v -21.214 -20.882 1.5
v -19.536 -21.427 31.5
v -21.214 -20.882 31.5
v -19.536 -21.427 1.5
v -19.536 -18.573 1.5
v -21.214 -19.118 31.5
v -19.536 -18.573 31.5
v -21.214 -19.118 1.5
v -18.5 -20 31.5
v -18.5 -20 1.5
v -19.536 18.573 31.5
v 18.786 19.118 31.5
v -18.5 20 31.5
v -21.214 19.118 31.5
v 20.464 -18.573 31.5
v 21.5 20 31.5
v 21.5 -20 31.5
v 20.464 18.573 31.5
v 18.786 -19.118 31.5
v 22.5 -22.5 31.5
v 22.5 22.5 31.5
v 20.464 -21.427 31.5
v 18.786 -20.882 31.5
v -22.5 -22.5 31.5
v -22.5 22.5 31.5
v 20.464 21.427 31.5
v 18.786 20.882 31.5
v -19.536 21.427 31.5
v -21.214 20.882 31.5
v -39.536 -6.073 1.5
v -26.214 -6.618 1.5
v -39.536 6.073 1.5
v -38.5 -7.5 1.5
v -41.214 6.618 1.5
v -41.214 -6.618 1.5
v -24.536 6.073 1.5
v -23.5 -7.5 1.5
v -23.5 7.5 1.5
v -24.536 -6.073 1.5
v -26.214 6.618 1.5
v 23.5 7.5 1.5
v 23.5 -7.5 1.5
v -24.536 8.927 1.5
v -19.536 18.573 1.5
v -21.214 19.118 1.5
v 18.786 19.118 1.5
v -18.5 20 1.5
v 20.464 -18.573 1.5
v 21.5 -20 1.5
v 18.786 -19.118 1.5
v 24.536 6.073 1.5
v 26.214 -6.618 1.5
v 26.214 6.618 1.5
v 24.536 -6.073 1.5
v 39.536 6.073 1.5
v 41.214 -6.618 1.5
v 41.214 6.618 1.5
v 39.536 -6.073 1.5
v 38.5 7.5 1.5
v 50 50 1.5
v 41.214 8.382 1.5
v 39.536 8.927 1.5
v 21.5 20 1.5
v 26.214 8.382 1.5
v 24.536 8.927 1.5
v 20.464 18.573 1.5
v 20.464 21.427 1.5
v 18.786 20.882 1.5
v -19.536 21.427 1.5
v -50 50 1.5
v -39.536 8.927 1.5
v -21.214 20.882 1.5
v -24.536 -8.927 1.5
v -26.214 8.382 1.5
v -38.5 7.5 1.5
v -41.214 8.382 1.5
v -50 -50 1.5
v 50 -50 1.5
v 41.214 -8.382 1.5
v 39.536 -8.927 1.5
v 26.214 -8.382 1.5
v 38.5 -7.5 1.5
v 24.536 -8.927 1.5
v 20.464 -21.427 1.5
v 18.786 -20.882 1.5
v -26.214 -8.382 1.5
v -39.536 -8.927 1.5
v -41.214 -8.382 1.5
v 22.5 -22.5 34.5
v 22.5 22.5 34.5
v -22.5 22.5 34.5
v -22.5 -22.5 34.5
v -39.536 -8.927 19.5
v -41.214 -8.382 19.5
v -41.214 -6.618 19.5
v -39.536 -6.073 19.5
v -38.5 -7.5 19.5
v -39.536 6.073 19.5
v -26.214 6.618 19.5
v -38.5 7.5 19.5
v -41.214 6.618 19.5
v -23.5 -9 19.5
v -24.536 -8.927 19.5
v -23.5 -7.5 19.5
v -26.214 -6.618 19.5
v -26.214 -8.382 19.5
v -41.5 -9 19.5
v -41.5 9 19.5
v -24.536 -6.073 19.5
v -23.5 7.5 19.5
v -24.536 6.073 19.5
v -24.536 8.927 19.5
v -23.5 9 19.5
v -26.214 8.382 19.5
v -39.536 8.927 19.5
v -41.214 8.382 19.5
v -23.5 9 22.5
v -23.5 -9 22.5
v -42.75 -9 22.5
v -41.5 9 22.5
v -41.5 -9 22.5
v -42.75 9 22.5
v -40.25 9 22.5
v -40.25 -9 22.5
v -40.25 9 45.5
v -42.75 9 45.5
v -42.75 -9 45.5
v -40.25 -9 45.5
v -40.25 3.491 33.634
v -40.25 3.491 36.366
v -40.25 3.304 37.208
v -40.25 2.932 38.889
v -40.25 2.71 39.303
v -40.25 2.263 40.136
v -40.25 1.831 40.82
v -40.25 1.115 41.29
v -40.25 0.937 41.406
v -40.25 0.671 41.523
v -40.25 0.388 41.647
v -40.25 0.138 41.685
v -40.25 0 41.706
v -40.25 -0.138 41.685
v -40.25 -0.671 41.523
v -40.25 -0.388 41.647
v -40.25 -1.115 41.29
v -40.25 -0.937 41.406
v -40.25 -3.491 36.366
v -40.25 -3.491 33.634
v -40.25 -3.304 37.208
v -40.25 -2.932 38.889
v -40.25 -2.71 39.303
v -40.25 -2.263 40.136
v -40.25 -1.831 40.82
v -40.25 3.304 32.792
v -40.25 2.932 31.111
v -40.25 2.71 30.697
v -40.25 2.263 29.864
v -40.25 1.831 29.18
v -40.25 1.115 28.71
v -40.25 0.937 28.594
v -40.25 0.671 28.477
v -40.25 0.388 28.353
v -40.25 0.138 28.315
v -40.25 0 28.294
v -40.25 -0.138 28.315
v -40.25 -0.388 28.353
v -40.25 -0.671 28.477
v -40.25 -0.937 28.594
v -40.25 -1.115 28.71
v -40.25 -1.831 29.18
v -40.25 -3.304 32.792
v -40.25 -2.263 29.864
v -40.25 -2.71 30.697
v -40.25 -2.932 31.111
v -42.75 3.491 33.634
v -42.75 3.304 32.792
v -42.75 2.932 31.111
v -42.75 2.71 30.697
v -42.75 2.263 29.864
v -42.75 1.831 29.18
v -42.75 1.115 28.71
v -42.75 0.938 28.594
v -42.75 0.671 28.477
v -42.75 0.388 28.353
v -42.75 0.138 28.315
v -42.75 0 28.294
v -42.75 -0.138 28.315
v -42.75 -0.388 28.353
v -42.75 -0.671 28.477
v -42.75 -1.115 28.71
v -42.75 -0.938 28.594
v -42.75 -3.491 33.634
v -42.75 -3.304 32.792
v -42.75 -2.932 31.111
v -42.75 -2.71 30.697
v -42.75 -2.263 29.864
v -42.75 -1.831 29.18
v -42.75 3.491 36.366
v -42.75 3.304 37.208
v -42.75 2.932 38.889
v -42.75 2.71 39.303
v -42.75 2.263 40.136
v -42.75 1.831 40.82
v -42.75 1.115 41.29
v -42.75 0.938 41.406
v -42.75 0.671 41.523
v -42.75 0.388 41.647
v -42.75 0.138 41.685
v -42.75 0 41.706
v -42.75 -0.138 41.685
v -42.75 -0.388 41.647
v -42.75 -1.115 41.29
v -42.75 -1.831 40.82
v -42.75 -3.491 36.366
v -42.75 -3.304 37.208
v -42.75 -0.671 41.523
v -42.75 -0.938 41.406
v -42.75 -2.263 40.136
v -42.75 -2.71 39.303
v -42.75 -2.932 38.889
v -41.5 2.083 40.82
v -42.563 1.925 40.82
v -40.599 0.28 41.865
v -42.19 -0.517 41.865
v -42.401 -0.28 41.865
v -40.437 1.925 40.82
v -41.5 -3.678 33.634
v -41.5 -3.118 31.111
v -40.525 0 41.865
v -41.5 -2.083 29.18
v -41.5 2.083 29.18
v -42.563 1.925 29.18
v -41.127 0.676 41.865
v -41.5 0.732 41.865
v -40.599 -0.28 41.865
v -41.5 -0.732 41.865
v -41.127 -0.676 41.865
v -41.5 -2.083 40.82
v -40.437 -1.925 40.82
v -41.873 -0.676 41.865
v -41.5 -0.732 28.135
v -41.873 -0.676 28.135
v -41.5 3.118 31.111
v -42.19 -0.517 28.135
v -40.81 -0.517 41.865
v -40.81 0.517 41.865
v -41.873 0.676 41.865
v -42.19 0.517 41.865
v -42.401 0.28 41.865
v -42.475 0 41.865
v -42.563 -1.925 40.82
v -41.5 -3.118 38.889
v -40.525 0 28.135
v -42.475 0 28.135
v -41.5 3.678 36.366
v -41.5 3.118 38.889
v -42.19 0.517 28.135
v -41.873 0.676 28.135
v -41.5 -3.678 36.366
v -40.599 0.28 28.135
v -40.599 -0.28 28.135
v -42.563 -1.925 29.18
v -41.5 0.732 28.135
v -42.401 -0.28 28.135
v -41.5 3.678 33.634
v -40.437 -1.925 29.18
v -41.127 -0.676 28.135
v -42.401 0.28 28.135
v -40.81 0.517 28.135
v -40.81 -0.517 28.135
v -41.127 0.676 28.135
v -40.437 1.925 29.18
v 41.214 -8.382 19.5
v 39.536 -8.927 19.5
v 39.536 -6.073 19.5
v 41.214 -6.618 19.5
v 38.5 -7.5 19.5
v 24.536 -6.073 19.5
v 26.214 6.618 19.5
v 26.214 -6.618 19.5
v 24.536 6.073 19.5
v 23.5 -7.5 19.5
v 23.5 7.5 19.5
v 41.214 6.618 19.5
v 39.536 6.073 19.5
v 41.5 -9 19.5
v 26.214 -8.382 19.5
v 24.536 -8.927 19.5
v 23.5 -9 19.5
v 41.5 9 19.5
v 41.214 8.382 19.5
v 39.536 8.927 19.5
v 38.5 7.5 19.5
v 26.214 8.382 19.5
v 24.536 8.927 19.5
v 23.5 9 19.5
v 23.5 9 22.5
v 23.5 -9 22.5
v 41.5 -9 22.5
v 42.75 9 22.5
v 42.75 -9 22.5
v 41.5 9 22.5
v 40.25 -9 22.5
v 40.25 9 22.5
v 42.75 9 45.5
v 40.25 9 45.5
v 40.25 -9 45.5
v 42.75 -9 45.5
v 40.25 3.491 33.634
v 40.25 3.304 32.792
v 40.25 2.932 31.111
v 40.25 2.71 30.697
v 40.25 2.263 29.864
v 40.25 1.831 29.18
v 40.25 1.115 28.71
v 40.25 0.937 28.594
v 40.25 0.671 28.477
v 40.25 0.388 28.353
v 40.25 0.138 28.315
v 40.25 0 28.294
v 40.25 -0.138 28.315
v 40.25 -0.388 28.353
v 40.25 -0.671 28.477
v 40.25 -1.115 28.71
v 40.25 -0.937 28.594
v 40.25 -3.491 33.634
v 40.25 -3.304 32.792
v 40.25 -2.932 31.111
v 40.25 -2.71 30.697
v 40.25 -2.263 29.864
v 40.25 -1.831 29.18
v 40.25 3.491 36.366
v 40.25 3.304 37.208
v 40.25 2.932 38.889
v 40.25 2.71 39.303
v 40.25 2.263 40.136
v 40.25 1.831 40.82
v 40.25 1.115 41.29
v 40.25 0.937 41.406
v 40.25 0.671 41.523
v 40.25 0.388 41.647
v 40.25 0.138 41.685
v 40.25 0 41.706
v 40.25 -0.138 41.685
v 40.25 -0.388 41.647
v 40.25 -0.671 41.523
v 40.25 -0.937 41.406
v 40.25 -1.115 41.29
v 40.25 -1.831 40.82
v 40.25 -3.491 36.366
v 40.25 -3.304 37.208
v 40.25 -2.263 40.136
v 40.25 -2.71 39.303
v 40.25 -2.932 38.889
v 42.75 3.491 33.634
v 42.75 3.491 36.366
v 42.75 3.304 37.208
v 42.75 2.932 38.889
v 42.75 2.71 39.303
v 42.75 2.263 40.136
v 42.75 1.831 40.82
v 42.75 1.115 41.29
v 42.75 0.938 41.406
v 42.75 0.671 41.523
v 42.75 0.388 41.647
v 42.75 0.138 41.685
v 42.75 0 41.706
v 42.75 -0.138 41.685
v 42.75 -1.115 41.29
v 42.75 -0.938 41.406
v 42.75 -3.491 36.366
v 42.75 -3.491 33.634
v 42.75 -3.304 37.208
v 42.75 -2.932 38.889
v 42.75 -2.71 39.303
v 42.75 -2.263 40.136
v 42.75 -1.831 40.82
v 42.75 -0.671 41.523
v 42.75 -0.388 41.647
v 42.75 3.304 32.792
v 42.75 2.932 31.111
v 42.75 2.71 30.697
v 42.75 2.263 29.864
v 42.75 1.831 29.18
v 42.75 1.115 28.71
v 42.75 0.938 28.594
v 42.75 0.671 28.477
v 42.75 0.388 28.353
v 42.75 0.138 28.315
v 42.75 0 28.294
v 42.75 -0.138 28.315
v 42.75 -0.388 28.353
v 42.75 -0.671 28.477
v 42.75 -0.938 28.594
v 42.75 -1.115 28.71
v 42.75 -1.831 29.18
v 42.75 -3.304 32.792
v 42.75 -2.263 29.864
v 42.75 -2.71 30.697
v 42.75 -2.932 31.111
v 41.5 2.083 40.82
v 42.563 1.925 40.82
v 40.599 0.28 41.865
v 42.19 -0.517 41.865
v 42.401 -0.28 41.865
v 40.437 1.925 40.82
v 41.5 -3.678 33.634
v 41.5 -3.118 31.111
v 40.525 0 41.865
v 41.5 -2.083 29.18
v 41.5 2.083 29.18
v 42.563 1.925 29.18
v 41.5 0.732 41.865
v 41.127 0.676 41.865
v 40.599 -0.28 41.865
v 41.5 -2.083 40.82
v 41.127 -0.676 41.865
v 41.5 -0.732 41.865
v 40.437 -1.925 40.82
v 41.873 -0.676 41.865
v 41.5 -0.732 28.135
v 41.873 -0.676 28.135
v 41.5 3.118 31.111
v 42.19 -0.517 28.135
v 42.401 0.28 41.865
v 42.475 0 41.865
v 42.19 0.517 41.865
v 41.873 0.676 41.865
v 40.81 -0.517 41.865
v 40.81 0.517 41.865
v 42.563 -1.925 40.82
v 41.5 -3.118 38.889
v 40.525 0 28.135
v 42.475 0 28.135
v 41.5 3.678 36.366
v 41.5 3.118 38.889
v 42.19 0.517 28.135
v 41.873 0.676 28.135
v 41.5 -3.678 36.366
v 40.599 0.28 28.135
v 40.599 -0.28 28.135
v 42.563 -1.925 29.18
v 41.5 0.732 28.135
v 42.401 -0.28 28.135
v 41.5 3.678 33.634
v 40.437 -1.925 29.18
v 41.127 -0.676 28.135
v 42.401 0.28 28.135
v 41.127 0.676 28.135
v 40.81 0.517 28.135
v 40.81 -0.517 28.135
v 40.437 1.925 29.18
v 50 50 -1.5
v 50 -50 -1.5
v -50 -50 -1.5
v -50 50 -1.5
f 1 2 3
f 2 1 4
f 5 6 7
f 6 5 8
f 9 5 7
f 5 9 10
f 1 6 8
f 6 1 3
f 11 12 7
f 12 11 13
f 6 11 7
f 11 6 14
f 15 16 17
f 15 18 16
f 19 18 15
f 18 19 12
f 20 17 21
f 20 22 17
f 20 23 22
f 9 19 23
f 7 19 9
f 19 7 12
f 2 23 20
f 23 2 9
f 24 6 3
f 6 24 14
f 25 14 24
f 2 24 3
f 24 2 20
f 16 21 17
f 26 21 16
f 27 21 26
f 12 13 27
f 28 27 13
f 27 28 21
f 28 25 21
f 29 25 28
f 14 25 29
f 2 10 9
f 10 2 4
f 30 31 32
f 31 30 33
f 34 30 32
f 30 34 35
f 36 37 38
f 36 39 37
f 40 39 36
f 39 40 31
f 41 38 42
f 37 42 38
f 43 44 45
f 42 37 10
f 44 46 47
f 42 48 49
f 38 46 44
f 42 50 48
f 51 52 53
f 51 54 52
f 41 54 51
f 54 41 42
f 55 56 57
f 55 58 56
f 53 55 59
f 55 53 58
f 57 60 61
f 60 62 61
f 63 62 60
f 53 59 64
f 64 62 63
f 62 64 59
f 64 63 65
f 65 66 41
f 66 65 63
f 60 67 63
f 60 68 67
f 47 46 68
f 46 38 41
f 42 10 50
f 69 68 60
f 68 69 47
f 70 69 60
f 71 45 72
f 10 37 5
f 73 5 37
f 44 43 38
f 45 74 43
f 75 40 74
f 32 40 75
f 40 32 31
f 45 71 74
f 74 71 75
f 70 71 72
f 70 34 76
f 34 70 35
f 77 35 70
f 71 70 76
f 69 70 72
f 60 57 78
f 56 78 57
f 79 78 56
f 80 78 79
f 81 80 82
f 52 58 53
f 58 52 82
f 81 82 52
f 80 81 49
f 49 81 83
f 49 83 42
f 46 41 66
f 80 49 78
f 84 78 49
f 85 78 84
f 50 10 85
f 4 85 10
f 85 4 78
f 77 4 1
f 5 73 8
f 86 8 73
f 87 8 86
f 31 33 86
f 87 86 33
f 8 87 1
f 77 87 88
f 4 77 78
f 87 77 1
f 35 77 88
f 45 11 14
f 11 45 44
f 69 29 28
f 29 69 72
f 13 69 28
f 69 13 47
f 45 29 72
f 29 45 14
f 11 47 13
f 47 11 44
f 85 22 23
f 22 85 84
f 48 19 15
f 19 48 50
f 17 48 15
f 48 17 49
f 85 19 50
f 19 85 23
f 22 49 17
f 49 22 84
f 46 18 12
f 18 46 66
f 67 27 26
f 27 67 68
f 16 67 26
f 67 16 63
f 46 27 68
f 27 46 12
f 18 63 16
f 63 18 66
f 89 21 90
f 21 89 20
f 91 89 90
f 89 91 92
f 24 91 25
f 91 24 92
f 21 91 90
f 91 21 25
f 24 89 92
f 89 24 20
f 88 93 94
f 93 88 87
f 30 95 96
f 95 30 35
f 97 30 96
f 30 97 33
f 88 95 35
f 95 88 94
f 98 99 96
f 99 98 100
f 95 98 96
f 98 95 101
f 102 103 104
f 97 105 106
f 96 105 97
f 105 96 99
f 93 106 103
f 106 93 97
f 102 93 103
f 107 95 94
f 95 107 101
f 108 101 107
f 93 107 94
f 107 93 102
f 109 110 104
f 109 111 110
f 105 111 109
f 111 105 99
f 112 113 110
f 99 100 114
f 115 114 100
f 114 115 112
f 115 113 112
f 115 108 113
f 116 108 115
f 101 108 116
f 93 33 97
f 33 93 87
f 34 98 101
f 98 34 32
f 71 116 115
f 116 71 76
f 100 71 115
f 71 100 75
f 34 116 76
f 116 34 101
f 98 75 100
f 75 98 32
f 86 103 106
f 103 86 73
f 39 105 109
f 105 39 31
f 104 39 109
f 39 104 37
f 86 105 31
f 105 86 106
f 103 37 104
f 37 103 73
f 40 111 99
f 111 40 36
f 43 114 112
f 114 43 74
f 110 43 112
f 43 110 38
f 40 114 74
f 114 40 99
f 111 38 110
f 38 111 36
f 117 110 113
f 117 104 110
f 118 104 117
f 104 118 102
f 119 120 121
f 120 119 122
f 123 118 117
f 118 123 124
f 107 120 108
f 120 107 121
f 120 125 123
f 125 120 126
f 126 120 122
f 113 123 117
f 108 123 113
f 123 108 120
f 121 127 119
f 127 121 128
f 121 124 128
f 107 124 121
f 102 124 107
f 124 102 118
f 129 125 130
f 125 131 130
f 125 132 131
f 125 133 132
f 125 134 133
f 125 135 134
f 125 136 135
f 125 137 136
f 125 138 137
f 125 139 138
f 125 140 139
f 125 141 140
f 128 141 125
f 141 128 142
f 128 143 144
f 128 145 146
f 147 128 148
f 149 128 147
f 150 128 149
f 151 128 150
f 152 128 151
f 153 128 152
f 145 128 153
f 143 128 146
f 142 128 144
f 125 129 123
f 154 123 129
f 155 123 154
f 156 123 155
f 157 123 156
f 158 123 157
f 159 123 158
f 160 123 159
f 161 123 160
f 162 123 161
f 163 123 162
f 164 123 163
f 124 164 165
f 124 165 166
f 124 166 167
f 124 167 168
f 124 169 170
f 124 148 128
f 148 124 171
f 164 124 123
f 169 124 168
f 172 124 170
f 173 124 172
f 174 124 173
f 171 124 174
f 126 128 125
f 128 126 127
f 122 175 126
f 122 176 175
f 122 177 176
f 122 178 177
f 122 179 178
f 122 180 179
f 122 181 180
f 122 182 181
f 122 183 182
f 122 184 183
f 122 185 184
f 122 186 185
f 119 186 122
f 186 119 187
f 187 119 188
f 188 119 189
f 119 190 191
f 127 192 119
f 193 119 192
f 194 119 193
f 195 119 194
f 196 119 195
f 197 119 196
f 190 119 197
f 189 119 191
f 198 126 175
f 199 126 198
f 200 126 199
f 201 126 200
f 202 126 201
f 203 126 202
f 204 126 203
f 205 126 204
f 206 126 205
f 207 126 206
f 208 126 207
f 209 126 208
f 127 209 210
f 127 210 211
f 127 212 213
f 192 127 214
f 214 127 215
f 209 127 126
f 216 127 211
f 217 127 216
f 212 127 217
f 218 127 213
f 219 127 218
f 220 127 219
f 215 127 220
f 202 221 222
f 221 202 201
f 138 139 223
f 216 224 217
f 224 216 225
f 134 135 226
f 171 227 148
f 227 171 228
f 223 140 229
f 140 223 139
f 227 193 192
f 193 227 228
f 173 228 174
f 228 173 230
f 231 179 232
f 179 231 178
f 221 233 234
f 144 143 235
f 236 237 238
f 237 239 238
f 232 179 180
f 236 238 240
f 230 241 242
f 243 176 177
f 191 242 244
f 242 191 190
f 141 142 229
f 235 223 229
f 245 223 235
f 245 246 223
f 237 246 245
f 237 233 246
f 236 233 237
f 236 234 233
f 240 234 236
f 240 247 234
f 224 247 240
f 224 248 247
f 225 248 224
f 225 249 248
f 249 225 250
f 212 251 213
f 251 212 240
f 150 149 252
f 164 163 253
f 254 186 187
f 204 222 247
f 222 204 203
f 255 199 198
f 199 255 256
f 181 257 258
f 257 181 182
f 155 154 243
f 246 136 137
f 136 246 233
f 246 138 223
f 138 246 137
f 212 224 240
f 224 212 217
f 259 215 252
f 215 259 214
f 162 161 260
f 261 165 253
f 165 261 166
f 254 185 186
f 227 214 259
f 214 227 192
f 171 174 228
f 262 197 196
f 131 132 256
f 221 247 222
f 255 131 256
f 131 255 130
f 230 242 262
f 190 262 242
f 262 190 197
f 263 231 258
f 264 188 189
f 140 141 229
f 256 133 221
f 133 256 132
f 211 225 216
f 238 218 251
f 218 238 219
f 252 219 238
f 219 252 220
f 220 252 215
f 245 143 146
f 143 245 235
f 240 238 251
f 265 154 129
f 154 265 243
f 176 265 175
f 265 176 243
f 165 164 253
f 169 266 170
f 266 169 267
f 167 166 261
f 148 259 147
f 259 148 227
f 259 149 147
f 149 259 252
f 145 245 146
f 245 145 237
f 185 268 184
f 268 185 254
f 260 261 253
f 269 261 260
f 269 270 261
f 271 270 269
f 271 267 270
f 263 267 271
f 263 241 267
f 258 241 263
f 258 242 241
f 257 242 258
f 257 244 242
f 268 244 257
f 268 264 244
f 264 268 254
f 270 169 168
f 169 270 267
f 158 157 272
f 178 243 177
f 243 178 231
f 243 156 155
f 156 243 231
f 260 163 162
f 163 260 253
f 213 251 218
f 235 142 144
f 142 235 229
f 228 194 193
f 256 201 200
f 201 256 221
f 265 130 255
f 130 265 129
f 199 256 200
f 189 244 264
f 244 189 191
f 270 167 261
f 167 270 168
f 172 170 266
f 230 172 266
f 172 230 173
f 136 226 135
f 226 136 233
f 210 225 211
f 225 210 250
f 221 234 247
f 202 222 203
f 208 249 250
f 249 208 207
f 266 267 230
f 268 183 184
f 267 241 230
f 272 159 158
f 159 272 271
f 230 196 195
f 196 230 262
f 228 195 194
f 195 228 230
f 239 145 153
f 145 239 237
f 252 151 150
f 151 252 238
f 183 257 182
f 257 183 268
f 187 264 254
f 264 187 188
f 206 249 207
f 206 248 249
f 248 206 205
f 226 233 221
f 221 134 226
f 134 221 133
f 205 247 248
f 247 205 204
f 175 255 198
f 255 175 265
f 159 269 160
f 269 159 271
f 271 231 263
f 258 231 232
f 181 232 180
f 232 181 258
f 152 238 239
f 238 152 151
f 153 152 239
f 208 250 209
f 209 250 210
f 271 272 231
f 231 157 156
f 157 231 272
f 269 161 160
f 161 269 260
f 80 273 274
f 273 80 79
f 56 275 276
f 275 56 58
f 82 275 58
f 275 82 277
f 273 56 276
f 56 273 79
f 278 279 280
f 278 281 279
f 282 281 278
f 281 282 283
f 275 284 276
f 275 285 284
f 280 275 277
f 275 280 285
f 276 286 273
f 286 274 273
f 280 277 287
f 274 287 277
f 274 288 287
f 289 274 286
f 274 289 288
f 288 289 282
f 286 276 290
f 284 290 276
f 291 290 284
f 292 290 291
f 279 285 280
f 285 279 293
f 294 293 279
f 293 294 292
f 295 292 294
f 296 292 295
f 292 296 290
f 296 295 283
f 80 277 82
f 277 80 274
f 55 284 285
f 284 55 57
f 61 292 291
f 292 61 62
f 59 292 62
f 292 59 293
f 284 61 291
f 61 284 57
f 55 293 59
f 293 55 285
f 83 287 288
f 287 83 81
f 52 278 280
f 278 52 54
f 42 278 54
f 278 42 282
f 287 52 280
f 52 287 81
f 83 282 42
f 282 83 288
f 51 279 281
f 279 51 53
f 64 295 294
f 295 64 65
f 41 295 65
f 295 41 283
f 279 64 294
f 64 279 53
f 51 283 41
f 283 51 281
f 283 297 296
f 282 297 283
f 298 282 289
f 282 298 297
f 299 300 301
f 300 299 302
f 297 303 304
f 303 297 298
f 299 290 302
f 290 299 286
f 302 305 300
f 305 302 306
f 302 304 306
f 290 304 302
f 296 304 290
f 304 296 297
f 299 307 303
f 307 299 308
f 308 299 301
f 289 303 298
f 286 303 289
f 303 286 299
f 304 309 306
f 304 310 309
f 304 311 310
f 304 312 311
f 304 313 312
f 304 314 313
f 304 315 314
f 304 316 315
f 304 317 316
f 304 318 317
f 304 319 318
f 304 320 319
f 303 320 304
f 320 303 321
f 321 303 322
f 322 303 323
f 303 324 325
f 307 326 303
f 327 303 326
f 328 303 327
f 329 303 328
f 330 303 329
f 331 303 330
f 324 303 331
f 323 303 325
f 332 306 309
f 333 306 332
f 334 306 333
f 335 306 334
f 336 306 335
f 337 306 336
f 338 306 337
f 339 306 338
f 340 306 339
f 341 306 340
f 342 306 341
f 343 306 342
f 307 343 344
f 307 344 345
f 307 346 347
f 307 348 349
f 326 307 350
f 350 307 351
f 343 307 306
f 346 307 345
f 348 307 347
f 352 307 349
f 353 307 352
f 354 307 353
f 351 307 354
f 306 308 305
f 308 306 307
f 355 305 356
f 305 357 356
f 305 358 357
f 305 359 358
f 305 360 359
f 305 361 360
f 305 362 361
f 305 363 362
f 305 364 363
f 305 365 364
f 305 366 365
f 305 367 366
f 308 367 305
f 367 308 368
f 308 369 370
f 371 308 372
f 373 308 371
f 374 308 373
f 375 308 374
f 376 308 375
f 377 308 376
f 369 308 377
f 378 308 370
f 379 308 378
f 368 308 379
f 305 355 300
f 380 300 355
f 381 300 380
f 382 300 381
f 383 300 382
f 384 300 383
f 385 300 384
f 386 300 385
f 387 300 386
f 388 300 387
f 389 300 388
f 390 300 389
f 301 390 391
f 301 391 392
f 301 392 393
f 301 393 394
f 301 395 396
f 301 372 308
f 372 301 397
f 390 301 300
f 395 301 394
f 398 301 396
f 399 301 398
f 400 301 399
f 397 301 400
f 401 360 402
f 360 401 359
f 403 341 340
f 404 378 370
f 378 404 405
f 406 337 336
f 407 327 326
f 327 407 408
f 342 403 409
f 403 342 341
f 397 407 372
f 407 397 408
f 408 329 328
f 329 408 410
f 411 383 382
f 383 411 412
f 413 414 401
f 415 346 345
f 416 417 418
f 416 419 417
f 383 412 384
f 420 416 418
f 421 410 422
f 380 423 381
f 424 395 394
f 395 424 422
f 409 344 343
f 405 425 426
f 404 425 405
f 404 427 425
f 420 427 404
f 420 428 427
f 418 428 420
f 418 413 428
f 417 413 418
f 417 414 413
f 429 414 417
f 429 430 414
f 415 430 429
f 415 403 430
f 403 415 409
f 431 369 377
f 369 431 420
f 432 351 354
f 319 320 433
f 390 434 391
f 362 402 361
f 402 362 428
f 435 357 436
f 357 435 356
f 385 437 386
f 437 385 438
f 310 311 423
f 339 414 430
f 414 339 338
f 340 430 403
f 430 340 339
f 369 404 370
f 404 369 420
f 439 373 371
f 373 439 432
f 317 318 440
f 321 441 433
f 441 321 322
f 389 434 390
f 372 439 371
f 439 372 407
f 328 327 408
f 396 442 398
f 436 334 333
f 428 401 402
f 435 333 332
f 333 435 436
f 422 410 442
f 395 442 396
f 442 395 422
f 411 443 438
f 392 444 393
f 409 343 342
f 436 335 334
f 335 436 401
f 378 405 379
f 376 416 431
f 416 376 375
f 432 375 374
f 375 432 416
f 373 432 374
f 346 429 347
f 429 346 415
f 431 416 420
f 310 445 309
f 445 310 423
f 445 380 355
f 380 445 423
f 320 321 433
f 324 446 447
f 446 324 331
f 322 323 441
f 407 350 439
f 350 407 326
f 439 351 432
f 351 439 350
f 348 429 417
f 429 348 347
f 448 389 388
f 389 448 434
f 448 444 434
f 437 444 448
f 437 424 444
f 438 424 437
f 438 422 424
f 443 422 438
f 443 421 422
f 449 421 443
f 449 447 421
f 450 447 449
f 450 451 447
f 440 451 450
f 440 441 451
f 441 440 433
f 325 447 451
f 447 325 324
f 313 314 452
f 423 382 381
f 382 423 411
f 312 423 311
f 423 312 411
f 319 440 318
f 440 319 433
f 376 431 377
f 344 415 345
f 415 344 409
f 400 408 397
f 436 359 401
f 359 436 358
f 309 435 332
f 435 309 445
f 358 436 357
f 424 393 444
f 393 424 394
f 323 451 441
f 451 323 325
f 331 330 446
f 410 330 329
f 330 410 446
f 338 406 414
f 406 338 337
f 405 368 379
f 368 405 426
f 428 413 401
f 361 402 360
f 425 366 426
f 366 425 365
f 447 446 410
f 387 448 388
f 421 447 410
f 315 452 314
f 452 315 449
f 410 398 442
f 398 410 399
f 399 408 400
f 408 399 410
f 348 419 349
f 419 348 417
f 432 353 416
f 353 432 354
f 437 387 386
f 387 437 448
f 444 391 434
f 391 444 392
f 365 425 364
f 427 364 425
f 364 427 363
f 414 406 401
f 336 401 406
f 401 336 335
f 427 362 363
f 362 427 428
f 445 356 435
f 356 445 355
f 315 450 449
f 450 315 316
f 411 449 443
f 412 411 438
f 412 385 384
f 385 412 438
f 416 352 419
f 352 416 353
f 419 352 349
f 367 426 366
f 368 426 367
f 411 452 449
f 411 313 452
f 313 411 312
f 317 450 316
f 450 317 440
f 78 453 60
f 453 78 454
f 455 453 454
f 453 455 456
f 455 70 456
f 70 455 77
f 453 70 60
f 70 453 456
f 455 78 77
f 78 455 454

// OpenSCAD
//Alfredo Alvarez
// Escena de piso mesa y silla o posibles sillas

module piso()
{
    cube([100,100,3], center=true);
}

module mesa()
{
    //30 pulgadas es el tamano normal de un mesa
    //primer pierna
    translate([-20,-20,1.5])cylinder(h=30,r=1.5);
    //segunda pierna
    translate([-20,20,1.5])cylinder(h=30,r=1.5);
    //tercera pierna
    translate([20,-20,1.5])cylinder(h=30,r=1.5);
    //cuarta pierna
    translate([20,20,1.5])cylinder(h=30,r=1.5);
    
    //tapa de la mesa
    //altura mitad piso(z) + mitad mesa(z) + altura pata
    translate([0,0,33])cube([45,45,3],center=true);
}

module sillaBase()
{
    translate([-40,-7.5,1.5])cylinder(h=18,r=1.5);
    
    translate([-40,7.5,1.5])cylinder(h=18,r=1.5);
    
    translate([-25,-7.5,1.5])cylinder(h=18,r=1.5);
    
    translate([-25,7.5,1.5])cylinder(h=18,r=1.5);
    
    //altura mitad piso(z) + mitad mesa(z) + altura pata
    translate([-32.5,0,21])cube([18,18,3],center=true);
}

module espaldar()
{
    difference(){
    translate([-41.5,0,34])cube([2.5,18,23],center=true);
    translate([-41.5,0,35])scale([1,.75,1.4])sphere(5);     
    }
}

module silla()
{
        sillaBase();
        espaldar();
}



piso();
mesa();
silla();
mirror([1,0,0])silla();
